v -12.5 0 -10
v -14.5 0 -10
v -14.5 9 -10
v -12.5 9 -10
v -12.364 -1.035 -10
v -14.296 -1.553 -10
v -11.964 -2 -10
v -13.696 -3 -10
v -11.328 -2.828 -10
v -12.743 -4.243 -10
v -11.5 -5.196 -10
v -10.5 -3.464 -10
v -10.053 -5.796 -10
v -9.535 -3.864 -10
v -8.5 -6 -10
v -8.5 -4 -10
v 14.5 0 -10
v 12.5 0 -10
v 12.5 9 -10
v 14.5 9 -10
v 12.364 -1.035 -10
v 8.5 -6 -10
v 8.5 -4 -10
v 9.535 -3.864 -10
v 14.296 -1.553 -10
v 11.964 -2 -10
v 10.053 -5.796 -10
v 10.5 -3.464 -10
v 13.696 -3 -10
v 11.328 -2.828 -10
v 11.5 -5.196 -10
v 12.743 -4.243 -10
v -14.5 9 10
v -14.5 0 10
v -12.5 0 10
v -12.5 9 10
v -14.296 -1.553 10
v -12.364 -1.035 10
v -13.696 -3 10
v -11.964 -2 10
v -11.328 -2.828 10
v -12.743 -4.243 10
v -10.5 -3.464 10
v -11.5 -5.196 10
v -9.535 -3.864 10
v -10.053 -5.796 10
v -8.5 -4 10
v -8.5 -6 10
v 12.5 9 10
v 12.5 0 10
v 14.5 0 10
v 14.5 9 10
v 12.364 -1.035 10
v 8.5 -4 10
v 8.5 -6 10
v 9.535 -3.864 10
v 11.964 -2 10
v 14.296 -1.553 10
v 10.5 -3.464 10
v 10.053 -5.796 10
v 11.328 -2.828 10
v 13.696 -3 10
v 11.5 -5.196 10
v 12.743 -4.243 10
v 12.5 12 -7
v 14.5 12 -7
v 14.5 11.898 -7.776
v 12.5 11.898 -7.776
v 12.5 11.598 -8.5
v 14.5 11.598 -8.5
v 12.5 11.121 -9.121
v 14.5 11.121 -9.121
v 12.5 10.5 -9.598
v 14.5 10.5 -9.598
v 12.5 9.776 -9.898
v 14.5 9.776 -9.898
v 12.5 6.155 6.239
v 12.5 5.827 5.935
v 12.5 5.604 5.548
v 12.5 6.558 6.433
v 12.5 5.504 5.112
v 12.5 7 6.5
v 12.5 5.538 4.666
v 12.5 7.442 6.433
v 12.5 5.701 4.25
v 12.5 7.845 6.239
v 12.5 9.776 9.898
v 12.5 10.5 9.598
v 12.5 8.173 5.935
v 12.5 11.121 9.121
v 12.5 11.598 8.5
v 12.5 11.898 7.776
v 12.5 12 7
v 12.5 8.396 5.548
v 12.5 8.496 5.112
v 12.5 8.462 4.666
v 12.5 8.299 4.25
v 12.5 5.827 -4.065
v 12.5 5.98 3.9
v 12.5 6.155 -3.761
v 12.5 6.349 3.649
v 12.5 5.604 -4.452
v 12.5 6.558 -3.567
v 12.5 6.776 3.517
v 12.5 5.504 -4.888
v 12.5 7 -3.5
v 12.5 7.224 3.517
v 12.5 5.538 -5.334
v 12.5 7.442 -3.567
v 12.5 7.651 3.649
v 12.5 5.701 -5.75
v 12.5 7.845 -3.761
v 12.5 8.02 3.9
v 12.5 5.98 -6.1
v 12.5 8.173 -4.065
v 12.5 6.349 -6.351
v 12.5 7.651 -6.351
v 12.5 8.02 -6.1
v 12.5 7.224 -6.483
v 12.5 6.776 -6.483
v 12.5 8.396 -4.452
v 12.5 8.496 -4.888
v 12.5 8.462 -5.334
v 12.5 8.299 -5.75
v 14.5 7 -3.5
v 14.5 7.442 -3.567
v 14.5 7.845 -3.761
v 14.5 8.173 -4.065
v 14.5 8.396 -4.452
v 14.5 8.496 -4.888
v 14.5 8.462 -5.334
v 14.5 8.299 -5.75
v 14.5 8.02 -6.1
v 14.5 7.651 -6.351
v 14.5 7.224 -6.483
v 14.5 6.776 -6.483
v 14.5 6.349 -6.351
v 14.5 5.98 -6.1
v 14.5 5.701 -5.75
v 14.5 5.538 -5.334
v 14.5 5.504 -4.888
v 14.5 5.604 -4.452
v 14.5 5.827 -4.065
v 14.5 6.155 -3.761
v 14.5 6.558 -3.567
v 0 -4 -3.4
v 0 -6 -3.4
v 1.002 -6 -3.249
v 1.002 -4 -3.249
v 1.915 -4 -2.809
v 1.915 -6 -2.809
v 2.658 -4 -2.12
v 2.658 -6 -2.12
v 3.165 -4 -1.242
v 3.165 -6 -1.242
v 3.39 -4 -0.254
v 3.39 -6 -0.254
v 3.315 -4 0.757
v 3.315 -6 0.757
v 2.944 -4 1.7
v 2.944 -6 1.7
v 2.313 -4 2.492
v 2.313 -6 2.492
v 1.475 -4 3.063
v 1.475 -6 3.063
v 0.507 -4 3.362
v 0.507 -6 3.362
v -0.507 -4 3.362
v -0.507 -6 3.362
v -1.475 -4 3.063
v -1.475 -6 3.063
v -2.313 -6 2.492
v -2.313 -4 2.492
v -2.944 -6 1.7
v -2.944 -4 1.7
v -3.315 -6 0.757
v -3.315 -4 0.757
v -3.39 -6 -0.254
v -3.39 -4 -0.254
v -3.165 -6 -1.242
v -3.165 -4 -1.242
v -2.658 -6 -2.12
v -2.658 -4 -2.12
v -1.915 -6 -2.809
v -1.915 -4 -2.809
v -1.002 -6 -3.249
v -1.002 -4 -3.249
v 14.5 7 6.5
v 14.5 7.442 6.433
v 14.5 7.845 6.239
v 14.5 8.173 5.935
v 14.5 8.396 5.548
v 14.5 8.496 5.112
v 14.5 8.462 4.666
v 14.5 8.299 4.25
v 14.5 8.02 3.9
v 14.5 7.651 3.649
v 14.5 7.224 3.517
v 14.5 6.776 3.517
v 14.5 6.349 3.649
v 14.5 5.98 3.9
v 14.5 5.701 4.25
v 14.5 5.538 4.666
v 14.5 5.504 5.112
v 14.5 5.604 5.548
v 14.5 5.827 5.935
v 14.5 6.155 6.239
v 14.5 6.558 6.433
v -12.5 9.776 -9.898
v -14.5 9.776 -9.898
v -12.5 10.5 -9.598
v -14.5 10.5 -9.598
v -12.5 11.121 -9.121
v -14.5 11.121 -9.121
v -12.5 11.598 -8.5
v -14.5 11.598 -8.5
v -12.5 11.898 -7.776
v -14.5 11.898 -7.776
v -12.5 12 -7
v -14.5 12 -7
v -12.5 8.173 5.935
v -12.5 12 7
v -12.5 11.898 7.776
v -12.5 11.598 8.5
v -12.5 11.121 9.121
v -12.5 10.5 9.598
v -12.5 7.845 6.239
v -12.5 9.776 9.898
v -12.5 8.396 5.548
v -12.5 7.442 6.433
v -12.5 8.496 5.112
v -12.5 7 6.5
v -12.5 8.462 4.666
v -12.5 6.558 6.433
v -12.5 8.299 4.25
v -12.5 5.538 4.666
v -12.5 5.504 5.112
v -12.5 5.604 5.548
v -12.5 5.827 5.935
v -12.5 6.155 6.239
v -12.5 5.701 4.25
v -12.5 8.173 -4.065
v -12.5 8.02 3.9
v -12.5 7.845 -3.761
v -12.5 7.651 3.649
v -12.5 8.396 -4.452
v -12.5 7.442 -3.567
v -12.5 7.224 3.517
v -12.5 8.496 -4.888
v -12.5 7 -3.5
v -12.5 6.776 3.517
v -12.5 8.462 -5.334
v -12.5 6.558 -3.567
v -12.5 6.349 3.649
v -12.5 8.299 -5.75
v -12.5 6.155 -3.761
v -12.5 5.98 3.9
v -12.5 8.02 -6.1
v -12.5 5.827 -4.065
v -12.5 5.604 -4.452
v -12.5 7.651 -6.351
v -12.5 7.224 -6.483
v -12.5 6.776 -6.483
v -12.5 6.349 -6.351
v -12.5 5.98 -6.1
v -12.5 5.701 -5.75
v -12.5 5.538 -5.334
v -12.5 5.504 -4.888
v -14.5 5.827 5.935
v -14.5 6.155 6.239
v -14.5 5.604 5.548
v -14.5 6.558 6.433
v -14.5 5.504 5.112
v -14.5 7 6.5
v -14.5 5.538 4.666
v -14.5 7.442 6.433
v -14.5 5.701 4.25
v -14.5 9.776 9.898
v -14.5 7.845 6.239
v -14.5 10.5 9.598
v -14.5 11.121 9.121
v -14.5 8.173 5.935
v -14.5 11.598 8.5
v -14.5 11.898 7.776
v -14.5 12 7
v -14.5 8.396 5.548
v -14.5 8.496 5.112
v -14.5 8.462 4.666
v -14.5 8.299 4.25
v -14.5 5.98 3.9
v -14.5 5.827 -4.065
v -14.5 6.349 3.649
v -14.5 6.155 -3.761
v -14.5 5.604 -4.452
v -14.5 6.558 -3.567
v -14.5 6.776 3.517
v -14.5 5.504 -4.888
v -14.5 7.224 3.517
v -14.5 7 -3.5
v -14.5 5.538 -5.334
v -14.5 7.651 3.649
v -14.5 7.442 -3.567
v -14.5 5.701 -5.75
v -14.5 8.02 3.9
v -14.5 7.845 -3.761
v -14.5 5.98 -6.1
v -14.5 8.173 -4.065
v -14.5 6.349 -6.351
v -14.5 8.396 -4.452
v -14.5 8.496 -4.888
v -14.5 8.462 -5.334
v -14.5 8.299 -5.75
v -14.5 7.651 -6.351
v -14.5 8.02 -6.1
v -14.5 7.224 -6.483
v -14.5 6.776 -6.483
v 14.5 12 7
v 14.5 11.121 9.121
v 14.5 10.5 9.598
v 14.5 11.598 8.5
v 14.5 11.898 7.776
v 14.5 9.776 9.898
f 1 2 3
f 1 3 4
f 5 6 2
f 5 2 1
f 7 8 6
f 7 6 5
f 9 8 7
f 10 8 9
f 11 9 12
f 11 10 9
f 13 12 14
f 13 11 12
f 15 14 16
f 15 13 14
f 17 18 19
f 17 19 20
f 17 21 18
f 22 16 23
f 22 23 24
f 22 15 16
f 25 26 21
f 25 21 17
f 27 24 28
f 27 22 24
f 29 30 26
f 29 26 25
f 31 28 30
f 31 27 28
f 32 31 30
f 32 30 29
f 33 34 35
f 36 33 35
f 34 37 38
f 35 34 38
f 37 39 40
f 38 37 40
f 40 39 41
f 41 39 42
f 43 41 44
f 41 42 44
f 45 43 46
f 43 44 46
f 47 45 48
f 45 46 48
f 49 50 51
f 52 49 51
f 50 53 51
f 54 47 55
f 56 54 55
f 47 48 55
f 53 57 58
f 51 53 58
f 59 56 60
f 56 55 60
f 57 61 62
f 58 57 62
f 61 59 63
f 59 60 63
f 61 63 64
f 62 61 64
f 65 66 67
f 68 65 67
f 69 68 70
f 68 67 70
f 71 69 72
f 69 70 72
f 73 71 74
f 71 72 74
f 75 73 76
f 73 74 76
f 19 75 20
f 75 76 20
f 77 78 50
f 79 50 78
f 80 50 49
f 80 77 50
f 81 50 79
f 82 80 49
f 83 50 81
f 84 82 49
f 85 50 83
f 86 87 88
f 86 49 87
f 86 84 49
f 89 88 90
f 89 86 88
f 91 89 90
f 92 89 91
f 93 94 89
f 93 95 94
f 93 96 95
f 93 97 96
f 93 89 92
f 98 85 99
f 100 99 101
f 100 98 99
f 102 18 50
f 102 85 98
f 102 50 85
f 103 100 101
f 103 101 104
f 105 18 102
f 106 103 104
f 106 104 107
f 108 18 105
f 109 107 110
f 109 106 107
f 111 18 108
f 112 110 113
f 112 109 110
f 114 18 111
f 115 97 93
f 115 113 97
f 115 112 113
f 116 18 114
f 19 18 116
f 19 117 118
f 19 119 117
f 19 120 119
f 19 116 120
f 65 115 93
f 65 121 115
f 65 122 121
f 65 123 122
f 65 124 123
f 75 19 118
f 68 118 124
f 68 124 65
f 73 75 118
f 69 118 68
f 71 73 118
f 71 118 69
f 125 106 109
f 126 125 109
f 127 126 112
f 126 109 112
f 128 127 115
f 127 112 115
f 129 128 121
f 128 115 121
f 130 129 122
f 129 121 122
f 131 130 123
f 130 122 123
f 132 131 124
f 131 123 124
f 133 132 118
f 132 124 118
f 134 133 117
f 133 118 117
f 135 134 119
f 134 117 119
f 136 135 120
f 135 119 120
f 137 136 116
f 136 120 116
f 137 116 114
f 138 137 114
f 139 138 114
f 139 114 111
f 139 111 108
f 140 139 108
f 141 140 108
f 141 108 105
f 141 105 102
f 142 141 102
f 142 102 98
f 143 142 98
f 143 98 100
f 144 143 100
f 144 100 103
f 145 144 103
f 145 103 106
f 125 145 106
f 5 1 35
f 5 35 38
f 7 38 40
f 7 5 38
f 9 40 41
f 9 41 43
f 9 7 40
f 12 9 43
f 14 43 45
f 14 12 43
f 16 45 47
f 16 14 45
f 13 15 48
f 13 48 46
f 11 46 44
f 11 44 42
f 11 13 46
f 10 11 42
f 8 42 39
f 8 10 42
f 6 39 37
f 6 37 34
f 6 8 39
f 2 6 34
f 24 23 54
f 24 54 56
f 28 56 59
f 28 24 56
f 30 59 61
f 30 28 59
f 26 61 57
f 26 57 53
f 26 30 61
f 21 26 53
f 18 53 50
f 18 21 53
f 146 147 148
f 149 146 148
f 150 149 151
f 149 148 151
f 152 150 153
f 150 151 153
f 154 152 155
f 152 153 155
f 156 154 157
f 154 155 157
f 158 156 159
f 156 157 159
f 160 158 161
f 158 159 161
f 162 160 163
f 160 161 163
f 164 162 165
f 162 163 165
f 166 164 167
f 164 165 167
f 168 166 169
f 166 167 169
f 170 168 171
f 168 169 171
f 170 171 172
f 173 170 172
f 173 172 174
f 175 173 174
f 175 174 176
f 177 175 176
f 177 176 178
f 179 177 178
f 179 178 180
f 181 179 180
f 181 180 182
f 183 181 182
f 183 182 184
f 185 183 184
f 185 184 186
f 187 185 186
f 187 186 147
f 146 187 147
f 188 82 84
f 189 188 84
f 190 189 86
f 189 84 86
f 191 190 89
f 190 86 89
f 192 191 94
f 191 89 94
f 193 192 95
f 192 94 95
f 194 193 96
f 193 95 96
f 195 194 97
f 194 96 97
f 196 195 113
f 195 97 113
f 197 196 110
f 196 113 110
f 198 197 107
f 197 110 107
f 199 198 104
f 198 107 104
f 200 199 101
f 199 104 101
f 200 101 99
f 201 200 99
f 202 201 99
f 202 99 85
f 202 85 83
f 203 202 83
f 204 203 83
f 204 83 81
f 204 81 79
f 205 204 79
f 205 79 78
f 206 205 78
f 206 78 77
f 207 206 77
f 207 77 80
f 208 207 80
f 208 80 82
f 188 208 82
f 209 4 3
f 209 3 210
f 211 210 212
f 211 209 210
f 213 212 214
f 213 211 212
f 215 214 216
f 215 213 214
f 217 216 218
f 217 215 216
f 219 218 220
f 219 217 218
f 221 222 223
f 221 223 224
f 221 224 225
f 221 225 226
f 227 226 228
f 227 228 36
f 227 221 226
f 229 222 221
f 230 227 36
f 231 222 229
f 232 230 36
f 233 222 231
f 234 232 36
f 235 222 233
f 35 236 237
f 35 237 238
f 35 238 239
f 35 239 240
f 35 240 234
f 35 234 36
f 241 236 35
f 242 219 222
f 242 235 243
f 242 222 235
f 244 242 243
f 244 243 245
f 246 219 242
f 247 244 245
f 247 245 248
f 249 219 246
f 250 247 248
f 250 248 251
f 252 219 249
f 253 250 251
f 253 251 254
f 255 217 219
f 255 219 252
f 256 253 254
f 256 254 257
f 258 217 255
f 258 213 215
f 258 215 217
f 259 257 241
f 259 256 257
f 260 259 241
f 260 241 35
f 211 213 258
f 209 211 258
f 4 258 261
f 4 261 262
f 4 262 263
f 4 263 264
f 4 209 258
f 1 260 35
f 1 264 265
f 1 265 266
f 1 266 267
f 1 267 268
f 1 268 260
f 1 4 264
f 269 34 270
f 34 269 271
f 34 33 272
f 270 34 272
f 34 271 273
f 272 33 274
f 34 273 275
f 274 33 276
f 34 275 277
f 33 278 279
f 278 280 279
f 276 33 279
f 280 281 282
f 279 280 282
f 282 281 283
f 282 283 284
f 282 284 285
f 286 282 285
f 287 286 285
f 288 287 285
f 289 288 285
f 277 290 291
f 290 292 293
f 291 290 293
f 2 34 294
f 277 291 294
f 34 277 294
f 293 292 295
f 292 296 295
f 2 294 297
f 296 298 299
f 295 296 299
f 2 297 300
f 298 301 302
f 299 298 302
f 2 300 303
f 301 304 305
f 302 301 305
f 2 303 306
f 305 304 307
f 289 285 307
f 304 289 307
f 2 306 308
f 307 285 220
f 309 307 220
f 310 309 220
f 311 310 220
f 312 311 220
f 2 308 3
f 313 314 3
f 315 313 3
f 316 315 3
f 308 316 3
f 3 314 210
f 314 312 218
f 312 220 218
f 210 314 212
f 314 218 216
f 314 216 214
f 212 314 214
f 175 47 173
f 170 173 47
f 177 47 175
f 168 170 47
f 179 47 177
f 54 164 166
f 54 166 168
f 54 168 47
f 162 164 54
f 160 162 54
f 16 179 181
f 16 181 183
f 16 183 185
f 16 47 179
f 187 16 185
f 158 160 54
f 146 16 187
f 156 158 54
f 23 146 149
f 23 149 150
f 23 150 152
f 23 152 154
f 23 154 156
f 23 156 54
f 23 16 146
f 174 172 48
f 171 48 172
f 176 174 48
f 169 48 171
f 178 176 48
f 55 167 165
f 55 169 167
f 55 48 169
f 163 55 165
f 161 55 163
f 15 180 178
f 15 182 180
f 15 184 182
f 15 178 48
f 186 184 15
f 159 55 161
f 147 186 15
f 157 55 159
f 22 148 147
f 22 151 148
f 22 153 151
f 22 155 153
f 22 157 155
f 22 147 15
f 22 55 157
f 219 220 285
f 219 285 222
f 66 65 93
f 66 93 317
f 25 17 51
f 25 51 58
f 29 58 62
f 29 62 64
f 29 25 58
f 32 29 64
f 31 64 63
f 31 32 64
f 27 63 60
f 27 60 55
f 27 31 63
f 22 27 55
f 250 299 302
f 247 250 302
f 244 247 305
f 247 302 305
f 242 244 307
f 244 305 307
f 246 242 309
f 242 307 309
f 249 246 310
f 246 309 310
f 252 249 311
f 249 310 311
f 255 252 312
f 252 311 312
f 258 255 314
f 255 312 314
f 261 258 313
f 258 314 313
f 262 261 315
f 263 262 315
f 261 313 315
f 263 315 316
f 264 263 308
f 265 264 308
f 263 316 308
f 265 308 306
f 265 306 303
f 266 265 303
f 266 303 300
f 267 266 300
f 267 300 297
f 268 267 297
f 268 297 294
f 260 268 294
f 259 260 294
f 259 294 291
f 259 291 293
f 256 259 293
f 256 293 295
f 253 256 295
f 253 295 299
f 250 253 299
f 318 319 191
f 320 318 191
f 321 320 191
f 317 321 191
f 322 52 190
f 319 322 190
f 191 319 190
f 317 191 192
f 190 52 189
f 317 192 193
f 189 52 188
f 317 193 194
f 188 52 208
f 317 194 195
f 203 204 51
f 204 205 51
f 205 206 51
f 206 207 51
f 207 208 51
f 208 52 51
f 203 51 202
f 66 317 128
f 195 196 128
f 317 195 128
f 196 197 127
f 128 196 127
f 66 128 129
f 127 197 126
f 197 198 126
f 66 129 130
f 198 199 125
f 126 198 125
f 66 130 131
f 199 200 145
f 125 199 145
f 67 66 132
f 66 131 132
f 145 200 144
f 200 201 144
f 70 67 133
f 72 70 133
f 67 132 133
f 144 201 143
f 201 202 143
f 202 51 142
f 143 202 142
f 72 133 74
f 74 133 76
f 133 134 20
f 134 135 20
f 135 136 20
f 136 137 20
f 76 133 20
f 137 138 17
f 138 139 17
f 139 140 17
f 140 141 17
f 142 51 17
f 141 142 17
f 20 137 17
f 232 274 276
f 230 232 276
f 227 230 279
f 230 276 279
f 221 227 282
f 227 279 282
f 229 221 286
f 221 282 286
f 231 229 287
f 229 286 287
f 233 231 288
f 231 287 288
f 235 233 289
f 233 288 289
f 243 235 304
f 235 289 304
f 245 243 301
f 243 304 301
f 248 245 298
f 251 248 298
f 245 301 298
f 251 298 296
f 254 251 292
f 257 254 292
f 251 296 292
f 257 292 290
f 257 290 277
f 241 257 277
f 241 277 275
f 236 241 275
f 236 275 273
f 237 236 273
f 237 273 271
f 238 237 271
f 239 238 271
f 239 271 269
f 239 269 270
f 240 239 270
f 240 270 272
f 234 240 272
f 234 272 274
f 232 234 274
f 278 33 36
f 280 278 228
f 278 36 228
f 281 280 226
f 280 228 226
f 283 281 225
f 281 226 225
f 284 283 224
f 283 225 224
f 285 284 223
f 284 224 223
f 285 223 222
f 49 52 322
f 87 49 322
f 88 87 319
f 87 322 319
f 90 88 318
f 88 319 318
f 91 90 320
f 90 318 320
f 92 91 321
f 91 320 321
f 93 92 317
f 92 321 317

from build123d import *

# Parameters (mm, degrees)
SKETCH1_W            = 20
SKETCH1_H            = 6
BOSS_EXTRUDE1_DEPTH  = 14.5
SKETCH2_W            = 3
SKETCH2_H            = 20
BOSS_EXTRUDE2_DEPTH  = 12
SKETCH7_R            = 1.5
CUT_EXTRUDE1_DEPTH   = 33.939338184
SKETCH8_R            = 3.4
CUT_EXTRUDE2_DEPTH   = 26.184320519
FILLET1_R            = 3
CONVERT_SOLID3_START = -10
CONVERT_SOLID3_DEPTH = 20


# Read off the part's stored shape, not the designer's step: Convert-Solid3
with BuildPart() as part:
    # Sketch1 → Boss-Extrude1 (new, symmetric)
    with BuildSketch(Plane(origin=(0, 0, 0), x_dir=(0, 0, -1), z_dir=(1, 0, 0))):
        with Locations((0, -3)):
            Rectangle(SKETCH1_W, SKETCH1_H)
    extrude(amount=BOSS_EXTRUDE1_DEPTH, both=True)

    # Sketch2 → Boss-Extrude2 (add)
    with BuildSketch(Plane(origin=(0, 0, 0), x_dir=(1, 0, 0), z_dir=(0, 1, 0))):
        with Locations((13, 0)):
            Rectangle(SKETCH2_W, SKETCH2_H)
        with Locations((-13, 0)):
            Rectangle(SKETCH2_W, SKETCH2_H)
    extrude(amount=BOSS_EXTRUDE2_DEPTH)

    # Sketch7 → Cut-Extrude1 (cut, through all)
    with BuildSketch(Plane.ZY.offset(14.5)):
        with Locations((-5, 7)):
            Circle(SKETCH7_R)
        with Locations((5, 7)):
            Circle(SKETCH7_R)
    extrude(amount=-CUT_EXTRUDE1_DEPTH, mode=Mode.SUBTRACT)

    # Sketch8 → Cut-Extrude2 (cut, through all)
    with BuildSketch(Plane.XZ.offset(6)):
        with Locations(Location((0, 0, 0), (0, 0, 270))):
            Circle(SKETCH8_R)
    extrude(amount=-CUT_EXTRUDE2_DEPTH, mode=Mode.SUBTRACT)

    # Fillet1
    fillet1_edges = [part.edges().sort_by_distance(p)[0] for p in [
        (-13, 12, 10),
        (-13, 12, -10),
        (13, 12, -10),
        (13, 12, 10),
    ]]
    fillet(fillet1_edges, radius=FILLET1_R)

    # Convert-Solid3 outline → Convert-Solid3 (cut)
    with BuildSketch(Plane.XY.offset(CONVERT_SOLID3_START)):
        with BuildLine():
            Line((14.5, -6), (14.5, 0))
            ThreePointArc((14.5, 0), (12.742640687, -4.242640687), (8.5, -6))
            Line((8.5, -6), (14.5, -6))
        make_face()
        with BuildLine():
            Line((-14.5, -6), (-8.5, -6))
            ThreePointArc((-8.5, -6), (-12.742640687, -4.242640687), (-14.5, 0))
            Line((-14.5, 0), (-14.5, -6))
        make_face()
        with BuildLine():
            Line((12.5, 0), (12.5, 12))
            Line((12.5, 12), (11.5, 12))
            Line((11.5, 12), (11.5, 0))
            Line((11.5, 0), (-11.5, 0))
            Line((-11.5, 0), (-11.5, 12))
            Line((-11.5, 12), (-12.5, 12))
            Line((-12.5, 12), (-12.5, 0))
            ThreePointArc((-12.5, 0), (-11.328427125, -2.828427125), (-8.5, -4))
            Line((-8.5, -4), (8.5, -4))
            ThreePointArc((8.5, -4), (11.328427125, -2.828427125), (12.5, 0))
        make_face()
    extrude(amount=CONVERT_SOLID3_DEPTH, mode=Mode.SUBTRACT)


solid = part.part
